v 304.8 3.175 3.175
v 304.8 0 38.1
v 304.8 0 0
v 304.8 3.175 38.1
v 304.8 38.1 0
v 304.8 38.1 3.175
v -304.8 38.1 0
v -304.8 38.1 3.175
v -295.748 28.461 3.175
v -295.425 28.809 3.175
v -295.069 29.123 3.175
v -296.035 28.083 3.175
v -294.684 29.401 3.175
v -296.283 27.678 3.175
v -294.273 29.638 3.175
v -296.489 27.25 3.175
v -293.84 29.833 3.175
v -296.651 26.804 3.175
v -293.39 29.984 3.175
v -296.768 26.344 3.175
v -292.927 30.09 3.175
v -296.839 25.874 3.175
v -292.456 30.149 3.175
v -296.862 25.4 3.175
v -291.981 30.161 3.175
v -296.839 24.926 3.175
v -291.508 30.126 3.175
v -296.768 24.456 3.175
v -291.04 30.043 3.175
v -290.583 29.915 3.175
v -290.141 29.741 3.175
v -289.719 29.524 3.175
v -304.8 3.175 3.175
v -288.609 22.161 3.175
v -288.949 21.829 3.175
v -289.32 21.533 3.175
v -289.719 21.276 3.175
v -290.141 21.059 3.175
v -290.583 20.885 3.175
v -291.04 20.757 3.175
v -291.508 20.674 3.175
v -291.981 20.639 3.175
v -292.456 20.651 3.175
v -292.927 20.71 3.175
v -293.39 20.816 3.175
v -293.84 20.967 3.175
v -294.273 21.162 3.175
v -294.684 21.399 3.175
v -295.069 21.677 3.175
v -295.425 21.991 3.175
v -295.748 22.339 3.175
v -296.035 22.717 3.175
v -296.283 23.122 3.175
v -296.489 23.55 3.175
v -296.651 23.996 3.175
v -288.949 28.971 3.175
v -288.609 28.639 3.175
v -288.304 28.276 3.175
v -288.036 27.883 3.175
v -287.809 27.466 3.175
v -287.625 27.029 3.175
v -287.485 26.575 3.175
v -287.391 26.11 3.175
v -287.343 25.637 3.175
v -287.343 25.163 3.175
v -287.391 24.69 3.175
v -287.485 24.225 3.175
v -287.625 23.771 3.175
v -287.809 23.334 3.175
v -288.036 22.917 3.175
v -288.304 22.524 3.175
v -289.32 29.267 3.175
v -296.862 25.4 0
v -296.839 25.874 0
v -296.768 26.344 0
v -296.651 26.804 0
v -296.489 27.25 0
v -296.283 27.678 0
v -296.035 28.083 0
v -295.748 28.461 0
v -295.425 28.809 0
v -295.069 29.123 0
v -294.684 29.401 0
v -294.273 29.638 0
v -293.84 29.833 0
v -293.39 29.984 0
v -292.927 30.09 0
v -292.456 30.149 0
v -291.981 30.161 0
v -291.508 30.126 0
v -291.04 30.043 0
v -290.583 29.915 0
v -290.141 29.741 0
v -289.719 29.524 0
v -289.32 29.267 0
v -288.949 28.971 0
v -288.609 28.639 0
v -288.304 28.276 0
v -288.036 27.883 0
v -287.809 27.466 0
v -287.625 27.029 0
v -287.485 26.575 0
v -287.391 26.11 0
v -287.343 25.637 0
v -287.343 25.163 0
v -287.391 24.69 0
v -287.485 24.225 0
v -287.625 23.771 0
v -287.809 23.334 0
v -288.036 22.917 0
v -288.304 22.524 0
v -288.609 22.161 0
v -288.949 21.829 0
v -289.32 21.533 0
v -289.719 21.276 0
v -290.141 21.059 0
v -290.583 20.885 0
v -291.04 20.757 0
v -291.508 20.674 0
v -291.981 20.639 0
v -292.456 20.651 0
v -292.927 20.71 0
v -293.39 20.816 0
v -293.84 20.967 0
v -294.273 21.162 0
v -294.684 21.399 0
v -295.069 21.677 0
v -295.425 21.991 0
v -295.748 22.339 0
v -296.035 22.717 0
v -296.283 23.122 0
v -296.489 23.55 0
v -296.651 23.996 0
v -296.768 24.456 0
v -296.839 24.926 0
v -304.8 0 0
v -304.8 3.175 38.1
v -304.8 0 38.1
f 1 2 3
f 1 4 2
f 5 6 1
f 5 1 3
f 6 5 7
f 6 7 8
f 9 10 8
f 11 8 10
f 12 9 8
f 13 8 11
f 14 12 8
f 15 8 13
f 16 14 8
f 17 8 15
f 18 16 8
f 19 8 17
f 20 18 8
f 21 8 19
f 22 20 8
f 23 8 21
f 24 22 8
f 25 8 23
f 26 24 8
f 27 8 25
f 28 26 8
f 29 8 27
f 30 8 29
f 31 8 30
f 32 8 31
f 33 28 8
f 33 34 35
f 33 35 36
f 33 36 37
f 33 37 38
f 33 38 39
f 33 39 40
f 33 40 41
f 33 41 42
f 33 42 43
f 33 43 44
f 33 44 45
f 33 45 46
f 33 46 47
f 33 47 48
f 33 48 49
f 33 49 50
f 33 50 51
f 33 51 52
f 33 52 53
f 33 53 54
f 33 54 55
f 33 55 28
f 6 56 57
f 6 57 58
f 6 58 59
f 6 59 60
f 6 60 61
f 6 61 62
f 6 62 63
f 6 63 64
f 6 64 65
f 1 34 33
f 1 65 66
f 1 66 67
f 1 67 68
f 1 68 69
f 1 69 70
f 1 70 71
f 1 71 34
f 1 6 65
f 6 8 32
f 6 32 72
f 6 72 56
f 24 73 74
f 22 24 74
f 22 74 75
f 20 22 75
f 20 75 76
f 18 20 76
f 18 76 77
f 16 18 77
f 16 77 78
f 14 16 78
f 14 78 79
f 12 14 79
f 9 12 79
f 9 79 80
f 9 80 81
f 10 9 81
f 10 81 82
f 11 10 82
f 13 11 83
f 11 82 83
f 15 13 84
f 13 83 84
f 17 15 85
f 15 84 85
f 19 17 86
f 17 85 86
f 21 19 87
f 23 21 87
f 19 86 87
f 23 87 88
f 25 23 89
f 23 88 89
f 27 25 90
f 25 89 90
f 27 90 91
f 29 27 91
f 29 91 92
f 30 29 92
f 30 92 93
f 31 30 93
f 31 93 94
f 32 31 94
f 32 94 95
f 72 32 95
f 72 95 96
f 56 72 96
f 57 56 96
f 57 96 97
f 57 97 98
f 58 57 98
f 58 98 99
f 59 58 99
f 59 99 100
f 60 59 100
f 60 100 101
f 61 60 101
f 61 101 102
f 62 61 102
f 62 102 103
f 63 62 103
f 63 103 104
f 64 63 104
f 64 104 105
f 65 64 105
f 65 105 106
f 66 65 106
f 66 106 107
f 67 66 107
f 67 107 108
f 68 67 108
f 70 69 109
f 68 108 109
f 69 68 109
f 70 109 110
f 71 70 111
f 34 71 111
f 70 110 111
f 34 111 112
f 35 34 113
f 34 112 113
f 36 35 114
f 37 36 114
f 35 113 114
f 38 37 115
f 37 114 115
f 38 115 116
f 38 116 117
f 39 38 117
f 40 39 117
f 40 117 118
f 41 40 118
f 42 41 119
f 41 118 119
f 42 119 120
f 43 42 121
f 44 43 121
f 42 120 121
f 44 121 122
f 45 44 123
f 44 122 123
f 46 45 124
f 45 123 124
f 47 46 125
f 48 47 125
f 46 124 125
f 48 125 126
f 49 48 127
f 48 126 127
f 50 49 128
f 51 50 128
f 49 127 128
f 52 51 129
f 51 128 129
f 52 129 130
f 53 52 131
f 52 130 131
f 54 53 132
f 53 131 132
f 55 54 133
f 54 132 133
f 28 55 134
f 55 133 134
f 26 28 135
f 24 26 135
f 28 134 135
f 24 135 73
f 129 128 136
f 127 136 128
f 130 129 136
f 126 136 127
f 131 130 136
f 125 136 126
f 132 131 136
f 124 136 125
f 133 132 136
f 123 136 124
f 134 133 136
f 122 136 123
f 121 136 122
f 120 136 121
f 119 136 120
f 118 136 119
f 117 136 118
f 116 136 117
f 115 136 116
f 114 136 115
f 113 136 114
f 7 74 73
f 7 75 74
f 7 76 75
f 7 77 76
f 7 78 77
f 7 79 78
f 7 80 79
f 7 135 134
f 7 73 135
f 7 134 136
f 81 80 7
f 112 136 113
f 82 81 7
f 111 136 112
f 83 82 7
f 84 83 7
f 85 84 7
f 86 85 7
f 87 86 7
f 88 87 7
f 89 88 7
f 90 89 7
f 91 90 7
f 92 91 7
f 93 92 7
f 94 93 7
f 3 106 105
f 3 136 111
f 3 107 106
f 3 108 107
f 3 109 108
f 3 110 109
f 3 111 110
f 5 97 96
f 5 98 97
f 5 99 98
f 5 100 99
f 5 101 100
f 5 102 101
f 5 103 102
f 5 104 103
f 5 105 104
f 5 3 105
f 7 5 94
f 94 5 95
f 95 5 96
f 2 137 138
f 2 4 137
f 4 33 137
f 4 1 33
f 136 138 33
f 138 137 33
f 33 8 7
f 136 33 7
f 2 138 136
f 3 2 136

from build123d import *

# Parameters (mm, degrees)
EXTRUDE_THIN1_DEPTH = 304.8
CUT_EXTRUDE1_REACH  = 311.526
SKETCH2_R           = 4.7625


with BuildPart() as part:
    # Sketch1 → Extrude-Thin1 (new, symmetric)
    with BuildSketch(Plane(origin=(0, 0, 0), x_dir=(0, 0, -1), z_dir=(1, 0, 0))):
        Polygon((-38.1, 0), (0, 0), (0, 38.1), (-3.175, 38.1), (-3.175, 3.175), (-38.1, 3.175), align=None)
    extrude(amount=EXTRUDE_THIN1_DEPTH, both=True)

    # Sketch2 → Cut-Extrude1 (cut, up to next)
    with BuildSketch(Plane(origin=(0, 0, 0), x_dir=(-1, 0, 0), z_dir=(0, 0, -1)), mode=Mode.PRIVATE) as cut_extrude1_sk1:
        with Locations((292.1, 25.4)):
            Circle(SKETCH2_R)
    cut_extrude1_tool1 = extrude(cut_extrude1_sk1.sketch, amount=-CUT_EXTRUDE1_REACH, mode=Mode.PRIVATE) & part.part
    add(cut_extrude1_tool1.solids().sort_by_distance((-292.1, 25.4, 0))[0], mode=Mode.SUBTRACT)


solid = part.part
